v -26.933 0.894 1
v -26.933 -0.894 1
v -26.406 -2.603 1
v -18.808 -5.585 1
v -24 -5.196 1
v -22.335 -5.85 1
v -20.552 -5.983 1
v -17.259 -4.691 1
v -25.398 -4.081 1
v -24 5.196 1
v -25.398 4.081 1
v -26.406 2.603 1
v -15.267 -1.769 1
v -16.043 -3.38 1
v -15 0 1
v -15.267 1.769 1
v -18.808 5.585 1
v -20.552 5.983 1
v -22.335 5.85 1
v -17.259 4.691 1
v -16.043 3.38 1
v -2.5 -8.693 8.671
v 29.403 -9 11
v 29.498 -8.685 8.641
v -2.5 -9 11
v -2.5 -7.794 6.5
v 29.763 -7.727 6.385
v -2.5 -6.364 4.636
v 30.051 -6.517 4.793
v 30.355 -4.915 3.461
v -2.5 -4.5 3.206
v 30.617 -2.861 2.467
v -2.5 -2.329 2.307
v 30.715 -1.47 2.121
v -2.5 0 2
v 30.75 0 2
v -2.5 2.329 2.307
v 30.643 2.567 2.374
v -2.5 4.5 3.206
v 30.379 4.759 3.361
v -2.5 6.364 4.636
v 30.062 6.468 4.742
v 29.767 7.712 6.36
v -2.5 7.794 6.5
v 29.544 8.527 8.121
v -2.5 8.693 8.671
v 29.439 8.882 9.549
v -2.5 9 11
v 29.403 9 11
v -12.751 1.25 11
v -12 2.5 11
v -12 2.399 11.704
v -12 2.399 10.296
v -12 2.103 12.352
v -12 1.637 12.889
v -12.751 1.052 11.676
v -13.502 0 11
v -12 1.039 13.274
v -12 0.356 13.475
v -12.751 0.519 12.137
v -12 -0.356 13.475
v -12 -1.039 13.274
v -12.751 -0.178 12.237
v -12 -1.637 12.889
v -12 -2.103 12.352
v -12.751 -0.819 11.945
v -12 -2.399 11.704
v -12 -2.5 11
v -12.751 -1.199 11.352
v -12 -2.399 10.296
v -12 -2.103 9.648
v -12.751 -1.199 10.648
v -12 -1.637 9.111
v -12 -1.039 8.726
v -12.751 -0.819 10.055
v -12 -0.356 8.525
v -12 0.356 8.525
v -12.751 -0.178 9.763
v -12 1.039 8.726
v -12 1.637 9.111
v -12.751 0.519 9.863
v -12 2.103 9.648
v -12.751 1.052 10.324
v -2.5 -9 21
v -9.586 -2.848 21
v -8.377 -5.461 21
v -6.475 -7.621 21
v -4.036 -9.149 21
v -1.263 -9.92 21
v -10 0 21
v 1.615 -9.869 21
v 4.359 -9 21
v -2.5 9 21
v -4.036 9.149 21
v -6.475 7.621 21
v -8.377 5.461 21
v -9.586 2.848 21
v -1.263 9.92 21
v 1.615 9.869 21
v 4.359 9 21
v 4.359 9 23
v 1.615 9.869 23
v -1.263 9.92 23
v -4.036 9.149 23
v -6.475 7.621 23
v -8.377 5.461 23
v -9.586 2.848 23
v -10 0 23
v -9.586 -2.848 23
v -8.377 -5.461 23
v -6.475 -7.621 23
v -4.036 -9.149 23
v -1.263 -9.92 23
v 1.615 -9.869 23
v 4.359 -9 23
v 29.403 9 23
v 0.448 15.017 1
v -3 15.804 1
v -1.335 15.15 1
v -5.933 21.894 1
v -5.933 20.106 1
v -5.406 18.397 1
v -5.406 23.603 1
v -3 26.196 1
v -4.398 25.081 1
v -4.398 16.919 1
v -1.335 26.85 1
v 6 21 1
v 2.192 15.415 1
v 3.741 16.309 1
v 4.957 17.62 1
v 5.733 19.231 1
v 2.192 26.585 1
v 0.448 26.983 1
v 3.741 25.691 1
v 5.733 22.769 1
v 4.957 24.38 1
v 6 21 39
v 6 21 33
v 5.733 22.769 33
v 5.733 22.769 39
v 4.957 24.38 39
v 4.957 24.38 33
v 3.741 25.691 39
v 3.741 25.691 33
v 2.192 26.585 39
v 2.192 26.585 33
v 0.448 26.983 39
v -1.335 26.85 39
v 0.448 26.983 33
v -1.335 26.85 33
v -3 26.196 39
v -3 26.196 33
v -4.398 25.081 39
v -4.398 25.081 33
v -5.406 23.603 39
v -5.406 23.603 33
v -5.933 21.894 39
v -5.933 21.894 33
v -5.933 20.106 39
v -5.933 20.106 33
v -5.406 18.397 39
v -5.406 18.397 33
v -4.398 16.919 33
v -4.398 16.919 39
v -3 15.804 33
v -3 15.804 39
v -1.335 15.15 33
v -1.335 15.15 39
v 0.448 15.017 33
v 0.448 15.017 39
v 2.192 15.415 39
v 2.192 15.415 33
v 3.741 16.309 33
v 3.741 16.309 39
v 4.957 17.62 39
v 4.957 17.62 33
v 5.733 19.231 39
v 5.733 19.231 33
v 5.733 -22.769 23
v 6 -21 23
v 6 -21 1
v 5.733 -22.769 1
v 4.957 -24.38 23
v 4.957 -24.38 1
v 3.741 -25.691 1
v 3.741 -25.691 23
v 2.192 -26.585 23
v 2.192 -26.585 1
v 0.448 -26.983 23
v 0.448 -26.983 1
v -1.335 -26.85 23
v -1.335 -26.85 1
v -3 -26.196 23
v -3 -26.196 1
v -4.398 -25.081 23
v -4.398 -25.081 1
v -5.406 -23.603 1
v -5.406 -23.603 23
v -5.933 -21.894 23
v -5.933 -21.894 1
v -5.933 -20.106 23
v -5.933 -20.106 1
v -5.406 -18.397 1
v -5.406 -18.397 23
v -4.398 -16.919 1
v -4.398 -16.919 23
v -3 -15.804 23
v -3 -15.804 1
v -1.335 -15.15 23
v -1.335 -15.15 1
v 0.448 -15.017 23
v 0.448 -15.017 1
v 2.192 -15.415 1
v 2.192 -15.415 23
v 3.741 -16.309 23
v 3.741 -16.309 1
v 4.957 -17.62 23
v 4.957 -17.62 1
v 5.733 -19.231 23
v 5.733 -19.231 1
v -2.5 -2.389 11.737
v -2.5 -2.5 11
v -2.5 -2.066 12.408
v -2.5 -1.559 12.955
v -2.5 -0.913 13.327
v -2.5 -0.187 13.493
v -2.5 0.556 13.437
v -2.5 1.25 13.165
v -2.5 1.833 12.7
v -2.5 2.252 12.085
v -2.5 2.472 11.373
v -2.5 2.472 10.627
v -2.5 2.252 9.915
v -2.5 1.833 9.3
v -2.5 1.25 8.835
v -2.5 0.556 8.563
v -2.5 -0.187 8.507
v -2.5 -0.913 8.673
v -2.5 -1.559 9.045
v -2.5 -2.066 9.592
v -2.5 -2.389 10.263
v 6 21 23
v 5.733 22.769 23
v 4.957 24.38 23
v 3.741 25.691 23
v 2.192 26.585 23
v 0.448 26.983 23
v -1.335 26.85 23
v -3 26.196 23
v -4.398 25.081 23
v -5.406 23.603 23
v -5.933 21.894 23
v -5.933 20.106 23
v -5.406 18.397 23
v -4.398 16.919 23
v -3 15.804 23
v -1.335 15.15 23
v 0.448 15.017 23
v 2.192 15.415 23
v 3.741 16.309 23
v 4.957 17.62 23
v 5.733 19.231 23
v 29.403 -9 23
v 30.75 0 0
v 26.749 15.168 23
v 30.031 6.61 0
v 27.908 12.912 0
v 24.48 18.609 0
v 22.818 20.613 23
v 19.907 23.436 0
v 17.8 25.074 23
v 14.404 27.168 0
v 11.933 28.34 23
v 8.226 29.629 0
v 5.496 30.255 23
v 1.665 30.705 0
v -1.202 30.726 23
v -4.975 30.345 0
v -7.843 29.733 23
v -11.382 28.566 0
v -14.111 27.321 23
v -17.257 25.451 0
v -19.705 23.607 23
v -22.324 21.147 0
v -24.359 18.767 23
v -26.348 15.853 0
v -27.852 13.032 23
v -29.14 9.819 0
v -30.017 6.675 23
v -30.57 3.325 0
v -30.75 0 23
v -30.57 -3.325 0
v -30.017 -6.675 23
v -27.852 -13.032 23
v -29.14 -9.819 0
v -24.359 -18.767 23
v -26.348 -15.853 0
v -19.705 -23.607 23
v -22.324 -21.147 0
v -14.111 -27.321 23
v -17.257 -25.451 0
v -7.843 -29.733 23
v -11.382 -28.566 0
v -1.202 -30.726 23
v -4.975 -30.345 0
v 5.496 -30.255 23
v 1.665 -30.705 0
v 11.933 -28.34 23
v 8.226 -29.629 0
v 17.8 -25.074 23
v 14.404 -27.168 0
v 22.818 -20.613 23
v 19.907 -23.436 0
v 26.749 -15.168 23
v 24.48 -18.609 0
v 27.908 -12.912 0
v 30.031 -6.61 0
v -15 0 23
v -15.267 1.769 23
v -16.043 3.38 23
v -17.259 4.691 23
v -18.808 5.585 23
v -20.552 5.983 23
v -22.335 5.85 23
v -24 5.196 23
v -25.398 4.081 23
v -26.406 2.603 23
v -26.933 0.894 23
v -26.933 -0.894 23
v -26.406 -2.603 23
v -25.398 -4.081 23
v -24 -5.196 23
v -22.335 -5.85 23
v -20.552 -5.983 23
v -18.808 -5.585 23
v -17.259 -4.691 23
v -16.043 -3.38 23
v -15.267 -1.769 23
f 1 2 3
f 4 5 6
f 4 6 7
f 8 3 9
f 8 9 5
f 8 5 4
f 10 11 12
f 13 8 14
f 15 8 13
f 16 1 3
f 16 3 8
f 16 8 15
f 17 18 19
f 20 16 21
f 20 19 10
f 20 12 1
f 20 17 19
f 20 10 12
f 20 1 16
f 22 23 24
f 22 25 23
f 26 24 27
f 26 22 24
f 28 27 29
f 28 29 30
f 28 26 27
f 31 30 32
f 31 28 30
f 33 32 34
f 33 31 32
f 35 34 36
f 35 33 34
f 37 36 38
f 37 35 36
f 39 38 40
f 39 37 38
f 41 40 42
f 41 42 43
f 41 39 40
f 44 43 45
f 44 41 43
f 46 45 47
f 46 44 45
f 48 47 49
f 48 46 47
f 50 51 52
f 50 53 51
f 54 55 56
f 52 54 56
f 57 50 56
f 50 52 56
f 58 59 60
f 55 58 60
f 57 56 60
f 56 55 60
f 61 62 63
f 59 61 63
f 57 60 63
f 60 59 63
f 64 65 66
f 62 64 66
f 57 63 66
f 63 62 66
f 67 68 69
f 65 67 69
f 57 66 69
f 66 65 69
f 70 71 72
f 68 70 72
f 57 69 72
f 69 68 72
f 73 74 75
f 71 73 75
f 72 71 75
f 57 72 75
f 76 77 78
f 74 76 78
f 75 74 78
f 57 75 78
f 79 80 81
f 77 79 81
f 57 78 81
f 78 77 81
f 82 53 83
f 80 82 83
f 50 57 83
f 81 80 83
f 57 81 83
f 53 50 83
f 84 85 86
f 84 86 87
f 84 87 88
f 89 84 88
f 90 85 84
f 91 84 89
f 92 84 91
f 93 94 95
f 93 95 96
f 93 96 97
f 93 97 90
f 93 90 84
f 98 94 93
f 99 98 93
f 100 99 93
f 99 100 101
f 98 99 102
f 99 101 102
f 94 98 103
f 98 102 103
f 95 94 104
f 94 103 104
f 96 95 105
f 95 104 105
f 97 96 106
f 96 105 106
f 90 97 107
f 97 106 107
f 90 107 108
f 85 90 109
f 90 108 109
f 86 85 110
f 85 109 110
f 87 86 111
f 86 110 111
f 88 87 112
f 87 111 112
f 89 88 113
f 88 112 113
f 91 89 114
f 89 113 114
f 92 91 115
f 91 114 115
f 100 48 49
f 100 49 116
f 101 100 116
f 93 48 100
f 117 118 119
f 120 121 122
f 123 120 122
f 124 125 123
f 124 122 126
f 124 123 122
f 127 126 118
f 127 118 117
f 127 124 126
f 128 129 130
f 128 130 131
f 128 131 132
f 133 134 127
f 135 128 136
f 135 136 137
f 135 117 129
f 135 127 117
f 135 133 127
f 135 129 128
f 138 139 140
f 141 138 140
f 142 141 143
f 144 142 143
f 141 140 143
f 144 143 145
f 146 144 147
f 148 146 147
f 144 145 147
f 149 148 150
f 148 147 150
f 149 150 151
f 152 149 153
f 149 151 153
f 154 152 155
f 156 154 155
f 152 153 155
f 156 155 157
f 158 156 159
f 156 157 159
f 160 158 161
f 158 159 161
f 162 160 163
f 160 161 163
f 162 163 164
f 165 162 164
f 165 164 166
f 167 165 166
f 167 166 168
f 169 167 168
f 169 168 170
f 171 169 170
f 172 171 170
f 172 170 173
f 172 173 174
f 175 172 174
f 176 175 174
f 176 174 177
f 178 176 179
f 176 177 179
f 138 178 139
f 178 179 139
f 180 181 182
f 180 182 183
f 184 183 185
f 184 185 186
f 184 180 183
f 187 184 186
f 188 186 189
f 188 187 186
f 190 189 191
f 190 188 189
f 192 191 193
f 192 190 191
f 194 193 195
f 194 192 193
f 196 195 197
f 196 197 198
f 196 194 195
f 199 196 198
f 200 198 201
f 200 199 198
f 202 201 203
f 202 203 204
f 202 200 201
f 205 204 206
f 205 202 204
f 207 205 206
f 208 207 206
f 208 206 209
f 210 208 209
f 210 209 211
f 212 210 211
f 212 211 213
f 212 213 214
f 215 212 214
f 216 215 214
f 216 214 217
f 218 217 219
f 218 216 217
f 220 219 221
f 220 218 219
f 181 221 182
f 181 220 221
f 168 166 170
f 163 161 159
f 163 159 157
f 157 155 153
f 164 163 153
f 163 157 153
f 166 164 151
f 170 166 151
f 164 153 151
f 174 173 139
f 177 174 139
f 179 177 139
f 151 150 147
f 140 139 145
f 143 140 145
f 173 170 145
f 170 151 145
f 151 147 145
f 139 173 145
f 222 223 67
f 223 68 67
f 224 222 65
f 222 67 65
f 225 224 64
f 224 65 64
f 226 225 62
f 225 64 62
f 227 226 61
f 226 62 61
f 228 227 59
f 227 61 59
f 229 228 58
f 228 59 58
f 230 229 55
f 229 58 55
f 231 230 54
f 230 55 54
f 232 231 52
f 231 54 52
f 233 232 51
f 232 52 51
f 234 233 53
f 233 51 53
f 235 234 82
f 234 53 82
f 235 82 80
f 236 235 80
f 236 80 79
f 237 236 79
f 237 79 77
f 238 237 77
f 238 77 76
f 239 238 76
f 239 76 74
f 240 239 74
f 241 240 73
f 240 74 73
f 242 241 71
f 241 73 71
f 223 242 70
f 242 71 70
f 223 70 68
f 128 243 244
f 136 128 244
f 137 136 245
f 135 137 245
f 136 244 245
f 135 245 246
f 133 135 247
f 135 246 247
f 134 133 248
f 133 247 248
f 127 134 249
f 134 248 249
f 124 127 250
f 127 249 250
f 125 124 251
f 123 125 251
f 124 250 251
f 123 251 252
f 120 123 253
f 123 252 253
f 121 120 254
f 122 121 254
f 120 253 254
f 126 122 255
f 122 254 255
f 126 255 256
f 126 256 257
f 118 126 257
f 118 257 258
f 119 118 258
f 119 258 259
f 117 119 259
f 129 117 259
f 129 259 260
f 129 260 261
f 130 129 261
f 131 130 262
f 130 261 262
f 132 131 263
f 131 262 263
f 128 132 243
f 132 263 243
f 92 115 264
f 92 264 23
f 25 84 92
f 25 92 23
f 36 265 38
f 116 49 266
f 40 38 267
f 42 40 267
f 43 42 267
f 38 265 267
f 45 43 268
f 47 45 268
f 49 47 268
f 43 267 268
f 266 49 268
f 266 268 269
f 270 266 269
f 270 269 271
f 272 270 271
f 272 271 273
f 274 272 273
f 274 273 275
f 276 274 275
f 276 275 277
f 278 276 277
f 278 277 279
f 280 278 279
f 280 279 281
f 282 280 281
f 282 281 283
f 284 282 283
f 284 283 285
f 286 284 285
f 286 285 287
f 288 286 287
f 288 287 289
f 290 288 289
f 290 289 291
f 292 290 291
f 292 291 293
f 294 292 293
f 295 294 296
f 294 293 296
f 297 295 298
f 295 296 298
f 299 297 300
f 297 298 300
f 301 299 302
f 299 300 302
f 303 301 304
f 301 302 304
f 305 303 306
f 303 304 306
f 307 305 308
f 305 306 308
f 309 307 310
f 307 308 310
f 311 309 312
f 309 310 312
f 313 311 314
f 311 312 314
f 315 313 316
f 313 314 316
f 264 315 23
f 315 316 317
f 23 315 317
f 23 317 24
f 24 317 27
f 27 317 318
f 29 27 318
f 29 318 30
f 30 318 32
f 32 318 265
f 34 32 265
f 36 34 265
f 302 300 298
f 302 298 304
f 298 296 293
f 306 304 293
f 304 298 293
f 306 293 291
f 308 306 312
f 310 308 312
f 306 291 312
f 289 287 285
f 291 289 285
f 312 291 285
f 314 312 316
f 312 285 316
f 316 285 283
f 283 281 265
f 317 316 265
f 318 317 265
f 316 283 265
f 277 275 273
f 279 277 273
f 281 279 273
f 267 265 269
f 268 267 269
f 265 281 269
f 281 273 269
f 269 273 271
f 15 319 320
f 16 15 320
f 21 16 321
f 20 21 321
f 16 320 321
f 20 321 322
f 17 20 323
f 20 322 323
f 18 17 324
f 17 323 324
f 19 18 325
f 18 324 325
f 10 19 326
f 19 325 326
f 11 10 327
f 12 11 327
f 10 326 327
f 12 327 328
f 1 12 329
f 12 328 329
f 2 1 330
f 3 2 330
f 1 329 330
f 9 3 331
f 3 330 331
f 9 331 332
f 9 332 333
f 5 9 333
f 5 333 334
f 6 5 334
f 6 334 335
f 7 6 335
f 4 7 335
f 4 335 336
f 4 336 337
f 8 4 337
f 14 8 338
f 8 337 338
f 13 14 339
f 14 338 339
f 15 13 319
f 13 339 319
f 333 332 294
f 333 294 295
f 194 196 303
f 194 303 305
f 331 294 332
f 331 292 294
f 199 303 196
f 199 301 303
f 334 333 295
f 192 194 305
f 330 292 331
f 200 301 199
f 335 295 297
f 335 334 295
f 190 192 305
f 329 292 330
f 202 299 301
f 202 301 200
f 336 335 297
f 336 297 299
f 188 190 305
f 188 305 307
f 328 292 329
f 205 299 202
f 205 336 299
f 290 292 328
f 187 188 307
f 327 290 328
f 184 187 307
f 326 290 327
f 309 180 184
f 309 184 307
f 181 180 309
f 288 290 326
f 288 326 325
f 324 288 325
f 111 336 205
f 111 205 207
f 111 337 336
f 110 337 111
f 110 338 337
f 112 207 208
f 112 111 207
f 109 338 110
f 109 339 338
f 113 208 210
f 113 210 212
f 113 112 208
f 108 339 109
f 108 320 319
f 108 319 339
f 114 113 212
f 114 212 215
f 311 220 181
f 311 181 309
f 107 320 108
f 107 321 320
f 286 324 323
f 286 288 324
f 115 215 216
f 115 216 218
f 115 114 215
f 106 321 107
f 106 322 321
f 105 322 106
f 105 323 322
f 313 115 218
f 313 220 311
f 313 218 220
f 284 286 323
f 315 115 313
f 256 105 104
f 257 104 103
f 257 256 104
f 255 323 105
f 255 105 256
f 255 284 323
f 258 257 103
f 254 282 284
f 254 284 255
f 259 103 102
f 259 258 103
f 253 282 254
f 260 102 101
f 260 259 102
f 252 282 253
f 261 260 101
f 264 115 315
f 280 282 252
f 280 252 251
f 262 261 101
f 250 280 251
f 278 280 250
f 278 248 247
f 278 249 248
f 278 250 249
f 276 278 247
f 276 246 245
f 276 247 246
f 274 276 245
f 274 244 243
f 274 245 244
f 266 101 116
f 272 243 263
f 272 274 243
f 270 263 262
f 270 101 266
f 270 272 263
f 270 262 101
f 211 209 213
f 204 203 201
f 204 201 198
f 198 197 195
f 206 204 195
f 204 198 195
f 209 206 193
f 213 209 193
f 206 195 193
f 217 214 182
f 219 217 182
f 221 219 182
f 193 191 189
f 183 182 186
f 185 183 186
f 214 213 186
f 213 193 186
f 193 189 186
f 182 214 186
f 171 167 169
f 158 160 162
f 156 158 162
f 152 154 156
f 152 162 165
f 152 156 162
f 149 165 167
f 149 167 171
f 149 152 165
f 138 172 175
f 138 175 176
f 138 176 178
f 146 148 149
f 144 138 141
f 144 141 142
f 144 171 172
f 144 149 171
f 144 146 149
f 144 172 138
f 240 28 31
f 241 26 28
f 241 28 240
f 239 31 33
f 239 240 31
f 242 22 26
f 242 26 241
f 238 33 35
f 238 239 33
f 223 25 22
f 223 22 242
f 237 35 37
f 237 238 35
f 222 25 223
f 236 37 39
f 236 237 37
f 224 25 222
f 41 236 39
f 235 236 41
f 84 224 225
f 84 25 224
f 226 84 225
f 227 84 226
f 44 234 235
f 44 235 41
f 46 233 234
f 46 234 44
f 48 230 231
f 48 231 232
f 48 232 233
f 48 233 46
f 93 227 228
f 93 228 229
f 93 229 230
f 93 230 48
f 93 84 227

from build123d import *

# Parameters (mm, degrees)
F0_R          = 30.75
F1_DEPTH      = 23
F4_DEPTH      = 31.7500001
F4_DEPTH_BACK = 2.5
F5_R          = 6
F6_DEPTH      = 22
F7_DEPTH      = 22
F9_D          = 5
F9_DEPTH      = 9.5
F9_TIP        = 1.5021515476
F10_R         = 10
F11_DEPTH     = 2
F13_R         = 6
F14_DEPTH     = 6


# Not quite as in the source:
# - a pattern or mirror of a feature is missing from the dataset's text; its kind, count and spacing are read off the source's solid


with BuildPart() as f1:
    # F0 (on Top) → F1 (new body)
    with BuildSketch(Plane.XY):
        Circle(F0_R)
    extrude(amount=F1_DEPTH)

    # F3 (on Right) → F4 (cut, two sides)
    with BuildSketch(Plane.YZ) as f4_sk:
        with BuildLine():
            Line((9, 11), (9, 44))
            Line((9, 44), (-9, 44))
            Line((-9, 44), (-9, 11))
            ThreePointArc((-9, 11), (-6.3639610307, 4.6360389693), (0, 2))
            ThreePointArc((0, 2), (6.3639610307, 4.6360389693), (9, 11))
        make_face()
    extrude(amount=F4_DEPTH, mode=Mode.SUBTRACT)
    extrude(f4_sk.sketch, amount=-F4_DEPTH_BACK, mode=Mode.SUBTRACT)

    # F5 (on face) → F6 (cut)
    with BuildSketch(Plane.XY.offset(23)):
        with Locations((0, 21)):
            Circle(F5_R)
    f6 = extrude(amount=-F6_DEPTH, mode=Mode.SUBTRACT)

    # F6_copies: F6 across plane
    add(f6.mirror(Plane(origin=(0, 0, 0), x_dir=(0, 0, -1), z_dir=(0, -1, 0))), mode=Mode.SUBTRACT)

    # F5 (on face) → F7 (cut)
    with BuildSketch(Plane.XY.offset(23)):
        with Locations((-21, 0)):
            Circle(F5_R)
    extrude(amount=-F7_DEPTH, mode=Mode.SUBTRACT)

    # F9
    with Locations(Plane.YZ.offset(-2.5)):
        with Locations((0, 11)):
            Hole(F9_D / 2, depth=F9_DEPTH)
            with Locations((0, 0, -(F9_DEPTH + F9_TIP / 2))):  # 118° drill point
                Cone(0, F9_D / 2, F9_TIP, mode=Mode.SUBTRACT)

    # F10 (on face) → F11 (cut)
    with BuildSketch(Plane.XY.offset(23)):
        Circle(F10_R)
    extrude(amount=-F11_DEPTH, mode=Mode.SUBTRACT)


with BuildPart() as f14:
    # F13 (on offset) → F14 (new body)
    with BuildSketch(Plane.XY.offset(33)):
        with Locations((0, 21)):
            Circle(F13_R)
    extrude(amount=F14_DEPTH)


solid = Compound([f1.part, f14.part])
